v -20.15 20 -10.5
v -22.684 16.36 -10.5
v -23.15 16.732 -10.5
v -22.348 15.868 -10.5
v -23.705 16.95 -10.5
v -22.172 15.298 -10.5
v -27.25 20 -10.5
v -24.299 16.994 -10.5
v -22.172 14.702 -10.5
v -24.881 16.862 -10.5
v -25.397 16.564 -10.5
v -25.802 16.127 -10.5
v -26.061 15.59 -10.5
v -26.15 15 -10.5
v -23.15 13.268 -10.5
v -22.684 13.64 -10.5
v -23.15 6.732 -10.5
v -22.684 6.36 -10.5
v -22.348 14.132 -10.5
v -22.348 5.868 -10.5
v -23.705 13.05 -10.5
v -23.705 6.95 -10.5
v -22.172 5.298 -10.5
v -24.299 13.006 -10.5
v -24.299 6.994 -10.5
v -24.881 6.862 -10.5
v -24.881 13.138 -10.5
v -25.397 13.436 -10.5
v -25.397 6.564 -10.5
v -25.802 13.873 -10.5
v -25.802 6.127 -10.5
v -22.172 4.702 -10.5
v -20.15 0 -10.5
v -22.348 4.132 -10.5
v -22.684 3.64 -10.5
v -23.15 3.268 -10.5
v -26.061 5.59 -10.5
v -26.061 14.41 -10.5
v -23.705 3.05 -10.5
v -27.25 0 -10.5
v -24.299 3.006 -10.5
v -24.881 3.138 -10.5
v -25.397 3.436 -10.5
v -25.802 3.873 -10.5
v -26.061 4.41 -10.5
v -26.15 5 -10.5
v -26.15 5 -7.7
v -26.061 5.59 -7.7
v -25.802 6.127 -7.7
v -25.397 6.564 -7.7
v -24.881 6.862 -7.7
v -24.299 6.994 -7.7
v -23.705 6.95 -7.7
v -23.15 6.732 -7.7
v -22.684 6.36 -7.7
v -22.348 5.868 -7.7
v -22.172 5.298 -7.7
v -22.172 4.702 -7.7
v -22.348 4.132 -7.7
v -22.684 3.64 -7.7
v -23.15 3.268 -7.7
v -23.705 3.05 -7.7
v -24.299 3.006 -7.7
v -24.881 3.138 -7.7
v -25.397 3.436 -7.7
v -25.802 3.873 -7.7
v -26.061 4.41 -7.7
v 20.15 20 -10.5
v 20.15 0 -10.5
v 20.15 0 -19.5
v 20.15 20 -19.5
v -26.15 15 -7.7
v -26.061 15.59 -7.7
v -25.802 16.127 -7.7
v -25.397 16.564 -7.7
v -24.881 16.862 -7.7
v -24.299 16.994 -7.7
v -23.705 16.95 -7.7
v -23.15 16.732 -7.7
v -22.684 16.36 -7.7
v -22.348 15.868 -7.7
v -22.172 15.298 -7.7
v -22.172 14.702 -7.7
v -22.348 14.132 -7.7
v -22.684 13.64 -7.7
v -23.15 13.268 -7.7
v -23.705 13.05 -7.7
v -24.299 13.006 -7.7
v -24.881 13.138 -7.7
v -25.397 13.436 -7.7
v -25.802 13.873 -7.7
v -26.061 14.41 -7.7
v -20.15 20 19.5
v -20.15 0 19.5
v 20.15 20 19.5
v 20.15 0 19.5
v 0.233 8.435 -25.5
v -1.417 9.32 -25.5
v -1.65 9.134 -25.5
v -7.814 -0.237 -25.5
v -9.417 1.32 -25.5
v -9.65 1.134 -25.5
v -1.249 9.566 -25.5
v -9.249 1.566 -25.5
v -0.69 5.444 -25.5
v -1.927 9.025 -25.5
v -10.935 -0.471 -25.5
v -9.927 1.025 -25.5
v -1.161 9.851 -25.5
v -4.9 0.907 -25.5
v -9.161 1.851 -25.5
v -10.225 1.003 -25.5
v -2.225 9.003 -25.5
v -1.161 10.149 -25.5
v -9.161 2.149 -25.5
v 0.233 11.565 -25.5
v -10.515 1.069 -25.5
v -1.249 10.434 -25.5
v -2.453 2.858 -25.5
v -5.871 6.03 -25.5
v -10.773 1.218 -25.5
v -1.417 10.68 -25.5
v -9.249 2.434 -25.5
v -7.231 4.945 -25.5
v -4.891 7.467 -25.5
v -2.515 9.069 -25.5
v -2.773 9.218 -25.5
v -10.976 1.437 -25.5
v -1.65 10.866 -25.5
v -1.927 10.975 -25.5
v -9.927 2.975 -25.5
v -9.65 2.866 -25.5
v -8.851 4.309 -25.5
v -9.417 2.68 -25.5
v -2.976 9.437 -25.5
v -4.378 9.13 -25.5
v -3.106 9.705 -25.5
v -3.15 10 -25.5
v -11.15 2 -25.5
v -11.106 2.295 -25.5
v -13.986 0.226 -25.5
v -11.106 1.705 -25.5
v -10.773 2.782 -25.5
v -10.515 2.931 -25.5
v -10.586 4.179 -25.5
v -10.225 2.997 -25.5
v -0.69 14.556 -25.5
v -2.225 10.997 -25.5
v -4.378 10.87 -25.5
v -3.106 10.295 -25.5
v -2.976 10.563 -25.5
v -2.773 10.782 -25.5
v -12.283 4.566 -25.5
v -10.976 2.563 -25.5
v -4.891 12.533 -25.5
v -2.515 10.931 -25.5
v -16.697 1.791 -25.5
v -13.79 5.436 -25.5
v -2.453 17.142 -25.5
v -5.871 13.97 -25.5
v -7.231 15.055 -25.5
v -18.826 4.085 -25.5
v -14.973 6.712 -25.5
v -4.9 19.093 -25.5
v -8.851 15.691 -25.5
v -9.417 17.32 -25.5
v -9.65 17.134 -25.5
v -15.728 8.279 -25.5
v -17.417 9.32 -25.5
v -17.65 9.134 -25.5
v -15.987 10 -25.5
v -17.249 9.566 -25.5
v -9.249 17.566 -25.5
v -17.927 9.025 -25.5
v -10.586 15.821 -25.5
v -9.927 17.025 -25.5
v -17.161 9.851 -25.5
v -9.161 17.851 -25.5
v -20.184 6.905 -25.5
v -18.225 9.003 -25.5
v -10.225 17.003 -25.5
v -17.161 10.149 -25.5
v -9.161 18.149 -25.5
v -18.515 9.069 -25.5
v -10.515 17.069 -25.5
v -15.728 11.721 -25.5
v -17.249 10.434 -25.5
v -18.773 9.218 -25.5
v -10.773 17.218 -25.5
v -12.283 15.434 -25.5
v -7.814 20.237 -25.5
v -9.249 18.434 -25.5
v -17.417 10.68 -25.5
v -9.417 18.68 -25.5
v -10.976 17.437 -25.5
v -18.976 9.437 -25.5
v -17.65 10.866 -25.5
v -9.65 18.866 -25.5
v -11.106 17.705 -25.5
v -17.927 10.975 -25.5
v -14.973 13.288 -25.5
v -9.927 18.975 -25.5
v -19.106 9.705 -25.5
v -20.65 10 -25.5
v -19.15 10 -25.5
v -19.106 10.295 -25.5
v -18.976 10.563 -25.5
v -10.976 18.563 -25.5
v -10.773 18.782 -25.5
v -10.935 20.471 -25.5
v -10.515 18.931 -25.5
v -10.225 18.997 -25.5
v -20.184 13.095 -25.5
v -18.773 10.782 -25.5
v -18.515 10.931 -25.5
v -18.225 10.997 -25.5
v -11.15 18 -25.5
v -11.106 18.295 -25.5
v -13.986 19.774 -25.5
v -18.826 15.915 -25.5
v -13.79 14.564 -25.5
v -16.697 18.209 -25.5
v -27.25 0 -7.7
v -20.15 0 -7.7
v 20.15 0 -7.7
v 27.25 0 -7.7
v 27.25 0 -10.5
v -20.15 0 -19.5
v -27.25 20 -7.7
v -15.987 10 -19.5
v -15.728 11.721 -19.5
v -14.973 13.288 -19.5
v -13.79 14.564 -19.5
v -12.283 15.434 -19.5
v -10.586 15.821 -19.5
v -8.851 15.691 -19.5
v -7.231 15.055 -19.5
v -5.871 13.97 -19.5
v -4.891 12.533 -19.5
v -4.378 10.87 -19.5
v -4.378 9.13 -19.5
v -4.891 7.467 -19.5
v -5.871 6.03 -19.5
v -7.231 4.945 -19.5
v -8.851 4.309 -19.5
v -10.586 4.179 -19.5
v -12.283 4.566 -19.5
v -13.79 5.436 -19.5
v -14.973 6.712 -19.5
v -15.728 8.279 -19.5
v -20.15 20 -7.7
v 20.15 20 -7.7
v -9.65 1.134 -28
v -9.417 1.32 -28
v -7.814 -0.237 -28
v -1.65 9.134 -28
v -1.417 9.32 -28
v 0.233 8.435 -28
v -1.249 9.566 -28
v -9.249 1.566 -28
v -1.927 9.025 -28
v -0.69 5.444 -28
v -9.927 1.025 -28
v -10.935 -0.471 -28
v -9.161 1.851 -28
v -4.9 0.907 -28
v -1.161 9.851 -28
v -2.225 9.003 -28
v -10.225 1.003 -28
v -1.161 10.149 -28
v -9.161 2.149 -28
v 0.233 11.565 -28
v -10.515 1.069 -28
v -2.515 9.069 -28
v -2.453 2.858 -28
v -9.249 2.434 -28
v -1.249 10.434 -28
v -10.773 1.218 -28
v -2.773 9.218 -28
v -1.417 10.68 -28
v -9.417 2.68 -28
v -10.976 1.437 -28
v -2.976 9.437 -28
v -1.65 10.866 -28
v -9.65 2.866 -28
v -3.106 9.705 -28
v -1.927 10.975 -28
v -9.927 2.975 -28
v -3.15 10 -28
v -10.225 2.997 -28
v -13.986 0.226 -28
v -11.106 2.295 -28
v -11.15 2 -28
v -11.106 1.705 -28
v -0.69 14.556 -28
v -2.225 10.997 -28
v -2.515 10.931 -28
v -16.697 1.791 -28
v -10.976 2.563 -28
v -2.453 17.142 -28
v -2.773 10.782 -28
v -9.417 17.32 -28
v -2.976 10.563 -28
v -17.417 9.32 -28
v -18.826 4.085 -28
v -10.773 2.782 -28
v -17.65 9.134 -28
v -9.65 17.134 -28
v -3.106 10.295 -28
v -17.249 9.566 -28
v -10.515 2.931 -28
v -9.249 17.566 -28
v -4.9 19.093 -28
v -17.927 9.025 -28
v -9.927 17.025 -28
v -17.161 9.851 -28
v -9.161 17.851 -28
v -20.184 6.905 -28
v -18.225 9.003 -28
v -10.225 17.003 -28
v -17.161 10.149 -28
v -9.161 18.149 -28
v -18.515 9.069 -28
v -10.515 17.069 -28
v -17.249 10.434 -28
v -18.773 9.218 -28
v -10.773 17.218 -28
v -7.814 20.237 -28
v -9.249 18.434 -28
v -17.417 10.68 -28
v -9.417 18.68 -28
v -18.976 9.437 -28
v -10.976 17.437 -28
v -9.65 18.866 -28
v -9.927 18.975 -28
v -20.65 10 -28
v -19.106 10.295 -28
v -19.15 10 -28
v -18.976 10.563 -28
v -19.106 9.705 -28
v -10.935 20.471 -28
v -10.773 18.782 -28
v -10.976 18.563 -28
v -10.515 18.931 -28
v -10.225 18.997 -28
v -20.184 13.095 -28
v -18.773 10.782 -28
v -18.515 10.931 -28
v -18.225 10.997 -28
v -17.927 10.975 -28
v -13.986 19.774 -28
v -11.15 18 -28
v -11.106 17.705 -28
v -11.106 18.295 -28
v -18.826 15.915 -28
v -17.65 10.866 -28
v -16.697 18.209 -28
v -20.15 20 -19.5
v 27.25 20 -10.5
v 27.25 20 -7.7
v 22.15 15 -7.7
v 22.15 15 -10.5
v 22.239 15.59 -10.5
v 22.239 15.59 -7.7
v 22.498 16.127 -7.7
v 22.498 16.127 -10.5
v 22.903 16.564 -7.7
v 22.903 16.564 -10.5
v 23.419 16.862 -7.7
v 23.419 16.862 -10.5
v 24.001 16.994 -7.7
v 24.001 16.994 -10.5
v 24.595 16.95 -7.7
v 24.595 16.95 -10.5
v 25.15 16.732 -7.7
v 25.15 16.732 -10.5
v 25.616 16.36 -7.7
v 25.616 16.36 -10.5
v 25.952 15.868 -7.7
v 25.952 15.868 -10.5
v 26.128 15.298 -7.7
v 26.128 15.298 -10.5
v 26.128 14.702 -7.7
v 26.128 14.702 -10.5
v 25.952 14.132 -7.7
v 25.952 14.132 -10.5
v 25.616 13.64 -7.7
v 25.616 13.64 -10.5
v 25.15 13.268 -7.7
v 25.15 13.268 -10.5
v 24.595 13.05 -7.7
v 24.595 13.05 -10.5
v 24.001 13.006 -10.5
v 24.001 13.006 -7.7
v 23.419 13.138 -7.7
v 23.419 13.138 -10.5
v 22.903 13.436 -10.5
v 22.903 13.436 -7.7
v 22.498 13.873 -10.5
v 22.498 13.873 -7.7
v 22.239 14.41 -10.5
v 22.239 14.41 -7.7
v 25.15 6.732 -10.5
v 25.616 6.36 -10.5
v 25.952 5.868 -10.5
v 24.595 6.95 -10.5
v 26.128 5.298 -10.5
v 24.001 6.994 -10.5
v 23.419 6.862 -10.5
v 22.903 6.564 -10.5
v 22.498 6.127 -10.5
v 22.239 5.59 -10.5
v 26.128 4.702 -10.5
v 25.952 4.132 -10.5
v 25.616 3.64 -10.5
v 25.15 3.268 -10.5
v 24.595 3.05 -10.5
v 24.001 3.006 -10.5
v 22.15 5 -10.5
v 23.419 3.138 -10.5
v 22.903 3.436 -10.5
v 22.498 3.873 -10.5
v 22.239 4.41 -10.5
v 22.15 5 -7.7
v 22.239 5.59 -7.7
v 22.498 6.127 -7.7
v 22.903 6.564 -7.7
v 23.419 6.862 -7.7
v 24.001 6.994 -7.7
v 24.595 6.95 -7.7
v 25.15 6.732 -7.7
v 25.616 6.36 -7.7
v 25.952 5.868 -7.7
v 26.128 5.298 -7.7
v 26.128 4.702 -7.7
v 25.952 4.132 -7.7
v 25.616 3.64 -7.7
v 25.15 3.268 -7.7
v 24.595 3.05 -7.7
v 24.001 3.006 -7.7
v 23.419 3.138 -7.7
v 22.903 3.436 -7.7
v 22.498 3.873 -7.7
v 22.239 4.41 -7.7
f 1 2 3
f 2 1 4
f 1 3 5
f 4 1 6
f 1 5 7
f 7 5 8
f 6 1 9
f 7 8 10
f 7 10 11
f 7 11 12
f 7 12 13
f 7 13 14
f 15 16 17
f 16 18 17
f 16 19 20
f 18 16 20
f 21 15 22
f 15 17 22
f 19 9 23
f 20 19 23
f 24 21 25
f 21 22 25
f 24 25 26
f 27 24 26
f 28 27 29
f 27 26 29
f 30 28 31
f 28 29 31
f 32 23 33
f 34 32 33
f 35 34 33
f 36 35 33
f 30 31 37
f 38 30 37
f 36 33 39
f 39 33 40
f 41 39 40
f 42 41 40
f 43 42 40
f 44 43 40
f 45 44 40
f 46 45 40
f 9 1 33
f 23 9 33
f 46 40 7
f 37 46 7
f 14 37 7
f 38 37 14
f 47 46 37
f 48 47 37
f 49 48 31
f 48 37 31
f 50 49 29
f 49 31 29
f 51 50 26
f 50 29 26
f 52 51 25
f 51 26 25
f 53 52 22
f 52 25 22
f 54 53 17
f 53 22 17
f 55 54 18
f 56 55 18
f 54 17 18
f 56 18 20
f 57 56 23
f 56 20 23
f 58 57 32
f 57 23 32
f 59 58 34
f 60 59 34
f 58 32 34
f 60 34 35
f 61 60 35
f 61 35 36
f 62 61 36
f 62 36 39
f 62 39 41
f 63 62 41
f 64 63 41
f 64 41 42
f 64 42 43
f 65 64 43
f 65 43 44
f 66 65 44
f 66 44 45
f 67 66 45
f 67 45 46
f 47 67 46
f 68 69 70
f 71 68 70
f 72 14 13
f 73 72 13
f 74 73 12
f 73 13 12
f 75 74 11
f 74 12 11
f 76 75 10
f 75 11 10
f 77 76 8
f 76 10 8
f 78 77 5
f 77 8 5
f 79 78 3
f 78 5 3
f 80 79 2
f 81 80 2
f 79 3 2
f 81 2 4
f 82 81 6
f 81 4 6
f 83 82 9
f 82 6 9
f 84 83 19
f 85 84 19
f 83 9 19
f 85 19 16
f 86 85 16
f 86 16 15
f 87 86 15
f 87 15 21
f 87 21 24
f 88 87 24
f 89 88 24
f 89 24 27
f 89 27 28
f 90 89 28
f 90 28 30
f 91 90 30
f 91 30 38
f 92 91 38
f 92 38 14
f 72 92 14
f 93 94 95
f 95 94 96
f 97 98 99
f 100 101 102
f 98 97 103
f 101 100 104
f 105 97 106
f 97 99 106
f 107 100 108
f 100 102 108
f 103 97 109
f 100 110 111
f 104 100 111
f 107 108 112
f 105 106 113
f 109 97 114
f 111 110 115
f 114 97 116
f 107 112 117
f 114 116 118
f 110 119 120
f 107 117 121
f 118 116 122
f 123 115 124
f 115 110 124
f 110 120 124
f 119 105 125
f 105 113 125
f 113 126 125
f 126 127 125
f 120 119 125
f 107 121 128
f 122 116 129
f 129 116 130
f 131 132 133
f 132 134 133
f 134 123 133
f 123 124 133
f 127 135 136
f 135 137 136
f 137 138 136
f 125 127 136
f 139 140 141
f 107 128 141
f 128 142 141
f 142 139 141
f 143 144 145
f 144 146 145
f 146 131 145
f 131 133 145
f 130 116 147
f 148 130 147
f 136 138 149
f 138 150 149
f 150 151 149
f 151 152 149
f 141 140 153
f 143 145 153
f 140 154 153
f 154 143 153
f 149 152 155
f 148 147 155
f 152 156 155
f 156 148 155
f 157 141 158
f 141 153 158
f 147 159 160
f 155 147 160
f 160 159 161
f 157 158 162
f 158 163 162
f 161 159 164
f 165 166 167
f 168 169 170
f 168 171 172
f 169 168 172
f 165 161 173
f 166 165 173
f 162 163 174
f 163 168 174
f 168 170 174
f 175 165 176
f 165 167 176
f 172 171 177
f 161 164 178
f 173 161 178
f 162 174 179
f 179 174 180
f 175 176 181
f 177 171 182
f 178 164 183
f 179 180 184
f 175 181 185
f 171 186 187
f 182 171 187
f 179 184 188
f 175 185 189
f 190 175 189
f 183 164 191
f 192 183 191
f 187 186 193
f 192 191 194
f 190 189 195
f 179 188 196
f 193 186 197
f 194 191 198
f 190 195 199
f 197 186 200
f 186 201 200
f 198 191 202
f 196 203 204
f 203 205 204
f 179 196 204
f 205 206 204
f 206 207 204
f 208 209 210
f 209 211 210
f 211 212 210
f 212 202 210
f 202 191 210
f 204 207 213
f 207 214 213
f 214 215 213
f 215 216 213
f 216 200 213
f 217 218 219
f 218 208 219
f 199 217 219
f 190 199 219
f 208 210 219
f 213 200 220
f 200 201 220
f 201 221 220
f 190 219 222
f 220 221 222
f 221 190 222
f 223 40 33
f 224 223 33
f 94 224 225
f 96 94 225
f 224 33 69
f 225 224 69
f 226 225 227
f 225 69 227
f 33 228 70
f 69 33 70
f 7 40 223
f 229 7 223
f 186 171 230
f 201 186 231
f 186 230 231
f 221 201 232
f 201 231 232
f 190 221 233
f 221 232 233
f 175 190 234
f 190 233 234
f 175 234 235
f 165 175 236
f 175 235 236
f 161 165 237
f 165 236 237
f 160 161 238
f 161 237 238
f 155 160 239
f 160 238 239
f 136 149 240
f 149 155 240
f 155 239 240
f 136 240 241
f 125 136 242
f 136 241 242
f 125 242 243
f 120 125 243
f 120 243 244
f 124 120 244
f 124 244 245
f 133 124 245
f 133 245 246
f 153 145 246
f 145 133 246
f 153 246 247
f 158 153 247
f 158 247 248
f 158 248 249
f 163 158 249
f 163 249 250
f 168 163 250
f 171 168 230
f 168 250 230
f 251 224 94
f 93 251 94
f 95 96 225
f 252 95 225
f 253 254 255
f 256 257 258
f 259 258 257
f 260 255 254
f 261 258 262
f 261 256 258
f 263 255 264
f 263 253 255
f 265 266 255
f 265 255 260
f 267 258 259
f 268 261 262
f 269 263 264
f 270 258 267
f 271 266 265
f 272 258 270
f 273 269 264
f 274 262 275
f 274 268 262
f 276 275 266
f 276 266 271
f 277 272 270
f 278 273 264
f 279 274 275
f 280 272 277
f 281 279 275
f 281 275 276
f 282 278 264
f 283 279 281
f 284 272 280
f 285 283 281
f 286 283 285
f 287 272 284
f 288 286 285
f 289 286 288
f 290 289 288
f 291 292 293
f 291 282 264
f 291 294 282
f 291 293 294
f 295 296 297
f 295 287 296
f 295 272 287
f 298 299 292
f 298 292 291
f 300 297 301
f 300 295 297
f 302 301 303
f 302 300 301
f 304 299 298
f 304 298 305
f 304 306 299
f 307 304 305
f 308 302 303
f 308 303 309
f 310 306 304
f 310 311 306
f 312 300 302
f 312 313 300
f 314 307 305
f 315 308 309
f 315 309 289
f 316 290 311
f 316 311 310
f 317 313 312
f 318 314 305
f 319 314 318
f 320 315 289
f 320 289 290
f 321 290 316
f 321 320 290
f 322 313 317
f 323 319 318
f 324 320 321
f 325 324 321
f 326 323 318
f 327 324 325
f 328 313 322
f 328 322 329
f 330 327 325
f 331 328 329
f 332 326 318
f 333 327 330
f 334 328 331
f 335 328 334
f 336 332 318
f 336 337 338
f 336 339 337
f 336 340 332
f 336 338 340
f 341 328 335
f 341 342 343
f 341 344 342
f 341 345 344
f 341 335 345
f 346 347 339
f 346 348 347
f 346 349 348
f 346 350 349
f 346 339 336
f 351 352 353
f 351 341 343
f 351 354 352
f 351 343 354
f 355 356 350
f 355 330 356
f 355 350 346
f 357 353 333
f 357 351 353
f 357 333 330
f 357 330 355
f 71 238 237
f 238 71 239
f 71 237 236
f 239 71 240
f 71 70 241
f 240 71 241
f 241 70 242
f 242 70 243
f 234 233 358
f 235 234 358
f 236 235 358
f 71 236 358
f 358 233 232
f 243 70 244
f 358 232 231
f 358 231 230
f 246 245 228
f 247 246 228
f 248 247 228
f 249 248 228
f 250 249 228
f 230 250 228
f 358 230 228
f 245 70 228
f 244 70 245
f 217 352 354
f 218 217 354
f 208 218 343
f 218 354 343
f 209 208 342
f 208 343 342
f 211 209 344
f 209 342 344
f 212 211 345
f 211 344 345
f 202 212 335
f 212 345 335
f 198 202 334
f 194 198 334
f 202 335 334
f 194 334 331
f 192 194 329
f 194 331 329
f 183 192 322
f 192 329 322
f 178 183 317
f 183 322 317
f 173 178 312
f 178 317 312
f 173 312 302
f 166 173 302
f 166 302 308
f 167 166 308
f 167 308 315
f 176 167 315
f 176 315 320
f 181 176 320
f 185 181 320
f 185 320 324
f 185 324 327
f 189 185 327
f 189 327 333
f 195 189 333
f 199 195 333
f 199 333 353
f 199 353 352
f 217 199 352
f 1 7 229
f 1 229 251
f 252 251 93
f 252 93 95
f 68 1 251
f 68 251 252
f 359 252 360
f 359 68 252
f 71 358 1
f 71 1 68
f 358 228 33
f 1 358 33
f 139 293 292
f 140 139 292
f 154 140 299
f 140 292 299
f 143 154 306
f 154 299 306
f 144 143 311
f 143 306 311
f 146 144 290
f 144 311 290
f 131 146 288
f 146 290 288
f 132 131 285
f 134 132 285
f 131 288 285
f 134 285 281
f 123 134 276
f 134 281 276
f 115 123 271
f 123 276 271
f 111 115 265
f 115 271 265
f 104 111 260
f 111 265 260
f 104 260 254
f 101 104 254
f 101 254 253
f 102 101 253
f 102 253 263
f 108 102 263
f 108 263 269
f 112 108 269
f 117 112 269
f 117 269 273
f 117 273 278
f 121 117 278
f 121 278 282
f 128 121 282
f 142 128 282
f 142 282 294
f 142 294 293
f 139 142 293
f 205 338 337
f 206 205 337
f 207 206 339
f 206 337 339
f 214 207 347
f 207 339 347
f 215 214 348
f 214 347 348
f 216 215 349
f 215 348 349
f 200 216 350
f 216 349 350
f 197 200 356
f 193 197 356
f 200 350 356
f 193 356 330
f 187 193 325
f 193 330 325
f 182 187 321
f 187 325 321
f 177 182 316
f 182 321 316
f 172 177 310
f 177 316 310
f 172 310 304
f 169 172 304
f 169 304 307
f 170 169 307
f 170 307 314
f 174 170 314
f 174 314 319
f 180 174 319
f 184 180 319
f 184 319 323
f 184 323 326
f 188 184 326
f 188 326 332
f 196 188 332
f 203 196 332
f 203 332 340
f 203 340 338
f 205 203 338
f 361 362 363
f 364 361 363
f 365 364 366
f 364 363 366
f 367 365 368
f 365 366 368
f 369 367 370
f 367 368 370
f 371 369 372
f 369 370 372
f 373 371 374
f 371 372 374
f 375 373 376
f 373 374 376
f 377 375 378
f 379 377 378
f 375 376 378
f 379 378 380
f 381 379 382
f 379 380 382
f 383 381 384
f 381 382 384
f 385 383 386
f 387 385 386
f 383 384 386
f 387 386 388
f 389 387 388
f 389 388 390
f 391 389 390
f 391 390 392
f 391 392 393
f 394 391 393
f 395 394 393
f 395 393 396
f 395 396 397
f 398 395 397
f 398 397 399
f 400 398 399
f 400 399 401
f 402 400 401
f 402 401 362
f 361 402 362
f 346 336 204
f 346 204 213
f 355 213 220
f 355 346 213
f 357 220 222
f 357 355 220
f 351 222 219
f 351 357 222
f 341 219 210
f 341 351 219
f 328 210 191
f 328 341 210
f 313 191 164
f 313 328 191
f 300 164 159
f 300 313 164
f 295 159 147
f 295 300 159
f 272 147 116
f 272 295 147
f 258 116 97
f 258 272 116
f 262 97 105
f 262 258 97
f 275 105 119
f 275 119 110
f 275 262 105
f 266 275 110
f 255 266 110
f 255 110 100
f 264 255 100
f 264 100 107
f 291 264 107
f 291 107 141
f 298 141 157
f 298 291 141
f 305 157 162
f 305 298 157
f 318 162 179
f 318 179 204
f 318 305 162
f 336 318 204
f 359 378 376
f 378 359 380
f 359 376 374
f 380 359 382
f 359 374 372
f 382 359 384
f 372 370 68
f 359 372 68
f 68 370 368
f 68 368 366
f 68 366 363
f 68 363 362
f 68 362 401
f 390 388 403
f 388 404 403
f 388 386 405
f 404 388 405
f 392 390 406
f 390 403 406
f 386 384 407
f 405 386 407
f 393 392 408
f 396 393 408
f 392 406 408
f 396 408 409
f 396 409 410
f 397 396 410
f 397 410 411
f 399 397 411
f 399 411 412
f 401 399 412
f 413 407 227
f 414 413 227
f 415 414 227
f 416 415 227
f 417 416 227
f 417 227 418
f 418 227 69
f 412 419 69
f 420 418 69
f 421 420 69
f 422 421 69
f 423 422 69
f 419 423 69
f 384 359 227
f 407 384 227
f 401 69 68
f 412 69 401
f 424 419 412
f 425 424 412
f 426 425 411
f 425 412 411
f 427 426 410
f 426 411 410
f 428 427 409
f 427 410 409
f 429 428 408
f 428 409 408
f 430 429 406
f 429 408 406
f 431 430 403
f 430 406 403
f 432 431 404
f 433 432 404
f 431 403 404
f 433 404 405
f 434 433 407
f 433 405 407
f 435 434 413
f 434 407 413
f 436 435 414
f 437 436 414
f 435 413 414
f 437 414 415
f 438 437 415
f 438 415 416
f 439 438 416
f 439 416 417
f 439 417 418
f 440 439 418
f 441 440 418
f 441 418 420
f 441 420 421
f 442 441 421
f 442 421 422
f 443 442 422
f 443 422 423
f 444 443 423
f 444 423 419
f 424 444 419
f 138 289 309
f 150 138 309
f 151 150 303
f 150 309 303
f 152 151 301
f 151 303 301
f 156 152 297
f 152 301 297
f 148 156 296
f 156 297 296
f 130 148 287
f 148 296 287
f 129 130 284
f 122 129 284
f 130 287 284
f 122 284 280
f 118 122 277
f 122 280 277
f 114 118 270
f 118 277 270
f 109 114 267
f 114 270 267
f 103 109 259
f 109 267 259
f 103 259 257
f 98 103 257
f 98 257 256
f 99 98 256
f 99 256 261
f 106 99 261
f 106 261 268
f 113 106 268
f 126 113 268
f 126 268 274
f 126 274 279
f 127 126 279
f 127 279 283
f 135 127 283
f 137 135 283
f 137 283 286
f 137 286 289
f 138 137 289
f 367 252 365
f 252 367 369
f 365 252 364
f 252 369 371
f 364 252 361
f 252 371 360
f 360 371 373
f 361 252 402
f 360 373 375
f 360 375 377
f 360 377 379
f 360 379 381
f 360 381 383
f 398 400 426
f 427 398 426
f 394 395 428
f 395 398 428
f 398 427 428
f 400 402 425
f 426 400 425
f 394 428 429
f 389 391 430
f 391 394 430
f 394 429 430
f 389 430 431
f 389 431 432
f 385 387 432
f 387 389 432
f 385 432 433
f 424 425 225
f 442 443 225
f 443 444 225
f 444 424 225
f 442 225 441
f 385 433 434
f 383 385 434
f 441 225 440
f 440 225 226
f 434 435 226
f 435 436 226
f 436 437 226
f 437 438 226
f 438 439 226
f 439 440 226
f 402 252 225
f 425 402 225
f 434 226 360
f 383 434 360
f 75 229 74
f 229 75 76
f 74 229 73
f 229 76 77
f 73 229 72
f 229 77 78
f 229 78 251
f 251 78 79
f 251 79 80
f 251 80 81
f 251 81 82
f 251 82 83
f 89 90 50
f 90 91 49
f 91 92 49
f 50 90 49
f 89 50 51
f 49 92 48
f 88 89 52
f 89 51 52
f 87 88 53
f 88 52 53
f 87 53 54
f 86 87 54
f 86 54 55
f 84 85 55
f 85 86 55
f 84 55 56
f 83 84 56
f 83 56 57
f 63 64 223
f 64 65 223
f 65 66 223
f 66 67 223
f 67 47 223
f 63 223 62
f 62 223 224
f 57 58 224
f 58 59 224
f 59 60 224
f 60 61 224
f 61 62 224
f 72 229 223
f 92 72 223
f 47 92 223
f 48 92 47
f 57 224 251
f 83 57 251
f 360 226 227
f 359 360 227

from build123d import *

# Parameters (mm, degrees)
SALIENTE_EXTRUIR1_DEPTH = 20
CROQUIS3_R              = 5.837463161
SALIENTE_EXTRUIR3_DEPTH = 8.5
CROQUIS4_R              = 2
CORTAR_EXTRUIR1_DEPTH   = 10
CROQUIS5_R              = 10.5
SALIENTE_EXTRUIR4_DEPTH = 2.5
CORTAR_EXTRUIR3_REACH   = 49.5
CROQUIS6_R              = 1


with BuildPart() as part:
    # Croquis1 → Saliente-Extruir1 (new body)
    with BuildSketch(Plane(origin=(0, 0, 0), x_dir=(1, 0, 0), z_dir=(0, 1, 0))):
        Polygon((20.15, 19.5), (-20.15, 19.5), (-20.15, 10.5), (-27.25, 10.5), (-27.25, 7.7), (-20.15, 7.7), (-20.15, -19.5), (20.15, -19.5), (20.15, 7.7), (27.25, 7.7), (27.25, 10.5), (20.15, 10.5), align=None)
    extrude(amount=SALIENTE_EXTRUIR1_DEPTH)

    # Croquis3 → Saliente-Extruir3 (add)
    with BuildSketch(Plane(origin=(0, 0, -19.5), x_dir=(-1, 0, 0), z_dir=(0, 0, -1))):
        with Locations((10.15, 10)):
            Circle(CROQUIS3_R)
    extrude(amount=SALIENTE_EXTRUIR3_DEPTH)

    # Croquis4 → Cortar-Extruir1 (cut)
    with BuildSketch(Plane(origin=(0, 0, -10.5), x_dir=(-1, 0, 0), z_dir=(0, 0, -1))):
        with Locations((-24.15, 15)):
            Circle(CROQUIS4_R)
        with Locations((-24.15, 5)):
            Circle(CROQUIS4_R)
        with Locations((24.15, 5)):
            Circle(CROQUIS4_R)
        with Locations((24.15, 15)):
            Circle(CROQUIS4_R)
    extrude(amount=-CORTAR_EXTRUIR1_DEPTH, mode=Mode.SUBTRACT)

    # Croquis5 → Saliente-Extruir4 (add)
    with BuildSketch(Plane(origin=(0, 0, -28), x_dir=(-1, 0, 0), z_dir=(0, 0, -1))):
        with Locations((10.15, 10)):
            Circle(CROQUIS5_R)
    extrude(amount=-SALIENTE_EXTRUIR4_DEPTH)

    # Croquis6 → Cortar-Extruir3 (cut, up to next)
    with BuildSketch(Plane(origin=(0, 0, -28), x_dir=(-1, 0, 0), z_dir=(0, 0, -1)), mode=Mode.PRIVATE) as cortar_extruir3_sk1:
        with Locations((10.15, 18)):
            Circle(CROQUIS6_R)
    cortar_extruir3_tool1 = extrude(cortar_extruir3_sk1.sketch, amount=-CORTAR_EXTRUIR3_REACH, mode=Mode.PRIVATE) & part.part
    add(cortar_extruir3_tool1.solids().sort_by_distance((-10.15, 18, -28))[0], mode=Mode.SUBTRACT)
    # Croquis6 → Cortar-Extruir3 (cut, up to next)
    with BuildSketch(Plane(origin=(0, 0, -28), x_dir=(-1, 0, 0), z_dir=(0, 0, -1)), mode=Mode.PRIVATE) as cortar_extruir3_sk2:
        with Locations((18.15, 10)):
            Circle(CROQUIS6_R)
    cortar_extruir3_tool2 = extrude(cortar_extruir3_sk2.sketch, amount=-CORTAR_EXTRUIR3_REACH, mode=Mode.PRIVATE) & part.part
    add(cortar_extruir3_tool2.solids().sort_by_distance((-18.15, 10, -28))[0], mode=Mode.SUBTRACT)
    # Croquis6 → Cortar-Extruir3 (cut, up to next)
    with BuildSketch(Plane(origin=(0, 0, -28), x_dir=(-1, 0, 0), z_dir=(0, 0, -1)), mode=Mode.PRIVATE) as cortar_extruir3_sk3:
        with Locations((2.15, 10)):
            Circle(CROQUIS6_R)
    cortar_extruir3_tool3 = extrude(cortar_extruir3_sk3.sketch, amount=-CORTAR_EXTRUIR3_REACH, mode=Mode.PRIVATE) & part.part
    add(cortar_extruir3_tool3.solids().sort_by_distance((-2.15, 10, -28))[0], mode=Mode.SUBTRACT)
    # Croquis6 → Cortar-Extruir3 (cut, up to next)
    with BuildSketch(Plane(origin=(0, 0, -28), x_dir=(-1, 0, 0), z_dir=(0, 0, -1)), mode=Mode.PRIVATE) as cortar_extruir3_sk4:
        with Locations((10.15, 2)):
            Circle(CROQUIS6_R)
    cortar_extruir3_tool4 = extrude(cortar_extruir3_sk4.sketch, amount=-CORTAR_EXTRUIR3_REACH, mode=Mode.PRIVATE) & part.part
    add(cortar_extruir3_tool4.solids().sort_by_distance((-10.15, 2, -28))[0], mode=Mode.SUBTRACT)


solid = part.part
